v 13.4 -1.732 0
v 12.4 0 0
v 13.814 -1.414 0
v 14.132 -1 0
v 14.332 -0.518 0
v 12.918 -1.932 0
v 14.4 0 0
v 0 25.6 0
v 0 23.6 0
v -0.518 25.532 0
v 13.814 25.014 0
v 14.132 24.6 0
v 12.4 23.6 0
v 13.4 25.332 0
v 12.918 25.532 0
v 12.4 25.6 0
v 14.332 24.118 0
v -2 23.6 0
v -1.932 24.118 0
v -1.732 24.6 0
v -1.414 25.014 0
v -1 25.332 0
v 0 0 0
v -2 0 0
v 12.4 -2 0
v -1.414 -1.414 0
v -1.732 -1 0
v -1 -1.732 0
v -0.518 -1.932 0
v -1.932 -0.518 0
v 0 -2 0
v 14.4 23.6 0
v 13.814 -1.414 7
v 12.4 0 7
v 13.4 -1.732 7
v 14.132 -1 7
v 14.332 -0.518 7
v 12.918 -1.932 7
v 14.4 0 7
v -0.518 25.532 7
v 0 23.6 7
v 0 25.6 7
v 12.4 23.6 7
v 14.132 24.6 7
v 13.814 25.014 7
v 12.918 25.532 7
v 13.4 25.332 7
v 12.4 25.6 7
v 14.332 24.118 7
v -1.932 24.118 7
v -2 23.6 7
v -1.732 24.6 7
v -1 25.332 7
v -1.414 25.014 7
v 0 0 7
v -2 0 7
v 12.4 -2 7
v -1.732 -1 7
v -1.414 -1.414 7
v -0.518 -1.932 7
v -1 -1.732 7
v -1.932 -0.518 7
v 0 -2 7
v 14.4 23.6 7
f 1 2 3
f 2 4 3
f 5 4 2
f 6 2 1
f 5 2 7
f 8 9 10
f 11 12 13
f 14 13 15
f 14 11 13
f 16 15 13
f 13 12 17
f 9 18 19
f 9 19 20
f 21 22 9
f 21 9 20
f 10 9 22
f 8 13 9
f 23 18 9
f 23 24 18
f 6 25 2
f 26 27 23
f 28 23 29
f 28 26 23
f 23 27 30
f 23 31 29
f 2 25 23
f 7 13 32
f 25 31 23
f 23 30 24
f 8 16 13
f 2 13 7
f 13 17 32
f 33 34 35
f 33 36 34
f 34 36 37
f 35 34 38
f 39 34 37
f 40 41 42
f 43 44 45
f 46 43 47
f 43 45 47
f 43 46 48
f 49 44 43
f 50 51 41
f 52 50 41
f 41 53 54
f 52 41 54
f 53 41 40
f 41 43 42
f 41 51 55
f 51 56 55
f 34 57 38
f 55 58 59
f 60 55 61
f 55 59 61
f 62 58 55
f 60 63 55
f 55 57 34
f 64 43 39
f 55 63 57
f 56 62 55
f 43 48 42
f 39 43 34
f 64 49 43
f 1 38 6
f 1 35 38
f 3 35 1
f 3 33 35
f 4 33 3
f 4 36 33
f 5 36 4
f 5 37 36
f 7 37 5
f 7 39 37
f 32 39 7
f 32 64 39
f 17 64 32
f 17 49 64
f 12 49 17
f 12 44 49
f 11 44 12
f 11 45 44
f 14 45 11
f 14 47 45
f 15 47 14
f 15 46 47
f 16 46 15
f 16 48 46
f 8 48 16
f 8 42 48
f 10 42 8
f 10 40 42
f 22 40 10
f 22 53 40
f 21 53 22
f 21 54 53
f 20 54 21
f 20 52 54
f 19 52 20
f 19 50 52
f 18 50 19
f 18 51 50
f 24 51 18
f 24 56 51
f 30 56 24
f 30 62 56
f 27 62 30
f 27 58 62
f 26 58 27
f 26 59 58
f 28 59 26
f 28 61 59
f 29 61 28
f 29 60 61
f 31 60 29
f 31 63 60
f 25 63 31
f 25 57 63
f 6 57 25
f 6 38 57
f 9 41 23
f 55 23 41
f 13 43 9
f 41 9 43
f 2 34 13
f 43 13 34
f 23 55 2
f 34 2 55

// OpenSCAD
STOL=.1;
SERVO_WIDTH = 23.5+STOL;
SERVO_HEIGHT=23.5+STOL;
SERVO_DEPTH=12.3+STOL;

ROUNDING = 2;

linear_extrude(height=7)
{
    difference() {
        minkowski() {
            square([SERVO_DEPTH, SERVO_WIDTH]);
            circle(ROUNDING, $fn=24);
        }
        square([SERVO_DEPTH, SERVO_WIDTH]);
    }
}
